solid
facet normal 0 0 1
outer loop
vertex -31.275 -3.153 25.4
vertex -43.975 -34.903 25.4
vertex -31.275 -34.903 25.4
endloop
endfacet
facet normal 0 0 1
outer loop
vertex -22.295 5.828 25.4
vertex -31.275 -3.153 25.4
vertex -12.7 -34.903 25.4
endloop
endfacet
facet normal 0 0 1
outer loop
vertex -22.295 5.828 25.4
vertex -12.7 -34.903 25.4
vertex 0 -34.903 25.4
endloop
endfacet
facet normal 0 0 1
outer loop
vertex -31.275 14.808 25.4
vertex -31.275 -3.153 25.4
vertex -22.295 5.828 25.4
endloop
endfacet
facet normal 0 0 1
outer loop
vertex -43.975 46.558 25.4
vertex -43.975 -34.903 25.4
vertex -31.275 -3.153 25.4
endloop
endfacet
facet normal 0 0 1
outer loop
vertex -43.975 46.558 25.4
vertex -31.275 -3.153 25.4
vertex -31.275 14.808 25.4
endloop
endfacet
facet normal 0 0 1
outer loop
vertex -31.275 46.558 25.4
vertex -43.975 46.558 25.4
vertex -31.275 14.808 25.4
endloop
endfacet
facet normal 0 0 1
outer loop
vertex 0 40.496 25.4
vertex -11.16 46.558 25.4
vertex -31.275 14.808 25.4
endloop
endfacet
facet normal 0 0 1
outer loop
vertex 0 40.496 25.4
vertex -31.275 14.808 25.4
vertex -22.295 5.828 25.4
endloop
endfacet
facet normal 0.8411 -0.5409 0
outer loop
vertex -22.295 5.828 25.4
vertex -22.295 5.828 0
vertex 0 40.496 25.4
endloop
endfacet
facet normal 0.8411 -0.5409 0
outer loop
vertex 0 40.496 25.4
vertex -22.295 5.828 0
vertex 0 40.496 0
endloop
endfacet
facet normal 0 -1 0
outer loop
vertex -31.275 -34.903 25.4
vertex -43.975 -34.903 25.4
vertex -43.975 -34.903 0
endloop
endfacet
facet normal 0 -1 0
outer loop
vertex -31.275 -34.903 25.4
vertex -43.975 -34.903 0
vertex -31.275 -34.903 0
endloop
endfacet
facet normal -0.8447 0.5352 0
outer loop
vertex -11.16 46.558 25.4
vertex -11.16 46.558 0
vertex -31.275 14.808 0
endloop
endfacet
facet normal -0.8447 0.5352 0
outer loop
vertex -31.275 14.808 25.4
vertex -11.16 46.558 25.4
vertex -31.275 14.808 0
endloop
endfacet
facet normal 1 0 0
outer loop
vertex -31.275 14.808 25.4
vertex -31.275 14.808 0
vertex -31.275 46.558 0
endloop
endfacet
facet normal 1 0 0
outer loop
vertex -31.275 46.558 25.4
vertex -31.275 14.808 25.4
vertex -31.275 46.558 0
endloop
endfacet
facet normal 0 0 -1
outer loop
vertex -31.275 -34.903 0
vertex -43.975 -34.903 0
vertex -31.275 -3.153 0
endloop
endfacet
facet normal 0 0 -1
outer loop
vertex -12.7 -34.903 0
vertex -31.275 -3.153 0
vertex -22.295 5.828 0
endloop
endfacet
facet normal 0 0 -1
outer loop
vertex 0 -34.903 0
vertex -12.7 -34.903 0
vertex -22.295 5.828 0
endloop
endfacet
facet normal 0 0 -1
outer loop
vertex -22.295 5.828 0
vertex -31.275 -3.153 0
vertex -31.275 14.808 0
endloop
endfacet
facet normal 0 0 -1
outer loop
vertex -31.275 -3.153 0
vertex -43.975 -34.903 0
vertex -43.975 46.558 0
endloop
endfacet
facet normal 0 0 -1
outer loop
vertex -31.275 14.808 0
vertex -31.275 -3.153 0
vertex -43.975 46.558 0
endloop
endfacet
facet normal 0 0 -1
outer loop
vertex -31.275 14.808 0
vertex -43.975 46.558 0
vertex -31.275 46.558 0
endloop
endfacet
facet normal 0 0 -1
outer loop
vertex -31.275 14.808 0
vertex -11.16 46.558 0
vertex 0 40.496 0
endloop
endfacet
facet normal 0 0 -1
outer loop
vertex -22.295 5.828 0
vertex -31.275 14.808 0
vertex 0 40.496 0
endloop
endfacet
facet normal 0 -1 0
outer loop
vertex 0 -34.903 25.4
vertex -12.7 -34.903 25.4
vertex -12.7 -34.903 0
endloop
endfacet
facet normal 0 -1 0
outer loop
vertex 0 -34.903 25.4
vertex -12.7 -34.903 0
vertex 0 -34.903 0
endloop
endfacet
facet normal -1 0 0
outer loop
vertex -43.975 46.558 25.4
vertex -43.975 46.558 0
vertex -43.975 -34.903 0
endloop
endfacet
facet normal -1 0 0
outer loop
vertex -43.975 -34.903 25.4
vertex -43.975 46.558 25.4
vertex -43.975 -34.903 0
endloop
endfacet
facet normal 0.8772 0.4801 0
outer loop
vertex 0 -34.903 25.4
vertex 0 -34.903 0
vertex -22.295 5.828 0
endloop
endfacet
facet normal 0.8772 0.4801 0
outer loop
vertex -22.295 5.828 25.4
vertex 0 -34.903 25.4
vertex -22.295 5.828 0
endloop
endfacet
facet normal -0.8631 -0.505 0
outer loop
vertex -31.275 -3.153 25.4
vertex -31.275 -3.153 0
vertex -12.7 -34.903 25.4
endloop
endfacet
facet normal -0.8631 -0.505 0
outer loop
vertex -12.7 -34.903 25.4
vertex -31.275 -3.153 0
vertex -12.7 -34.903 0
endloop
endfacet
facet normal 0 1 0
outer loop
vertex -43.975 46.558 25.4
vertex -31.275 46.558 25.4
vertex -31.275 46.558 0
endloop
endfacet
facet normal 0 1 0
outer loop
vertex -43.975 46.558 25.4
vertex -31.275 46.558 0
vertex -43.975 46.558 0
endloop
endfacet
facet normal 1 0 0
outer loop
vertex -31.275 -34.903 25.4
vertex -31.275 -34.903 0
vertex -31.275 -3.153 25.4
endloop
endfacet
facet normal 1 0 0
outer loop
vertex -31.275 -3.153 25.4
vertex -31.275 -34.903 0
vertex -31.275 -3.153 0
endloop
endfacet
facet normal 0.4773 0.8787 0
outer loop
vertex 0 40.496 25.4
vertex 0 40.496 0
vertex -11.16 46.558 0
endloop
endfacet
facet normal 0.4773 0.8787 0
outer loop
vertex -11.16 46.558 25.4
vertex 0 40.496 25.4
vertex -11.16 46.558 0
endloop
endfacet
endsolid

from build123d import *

# Parameters (mm, degrees)
F1_DEPTH = 25.4


with BuildPart() as f1:
    # F0 (on Top) → F1 (new body)
    with BuildSketch(Plane.XY):
        Polygon((-31.274958, 46.557813), (-43.974958, 46.557813), (-43.974958, -34.902699), (-31.274958, -34.902699), (-31.274958, -3.152699), (-22.294702, 5.827557), (-31.274958, 14.807813), align=None)
        Polygon((-11.159787, 46.557813), (-31.274958, 14.807813), (-22.294702, 5.827557), (0, 40.495705), align=None)
        Polygon((-22.294702, 5.827557), (-31.274958, -3.152699), (-12.7, -34.902699), (0, -34.902699), align=None)
    extrude(amount=F1_DEPTH)


solid = f1.part
